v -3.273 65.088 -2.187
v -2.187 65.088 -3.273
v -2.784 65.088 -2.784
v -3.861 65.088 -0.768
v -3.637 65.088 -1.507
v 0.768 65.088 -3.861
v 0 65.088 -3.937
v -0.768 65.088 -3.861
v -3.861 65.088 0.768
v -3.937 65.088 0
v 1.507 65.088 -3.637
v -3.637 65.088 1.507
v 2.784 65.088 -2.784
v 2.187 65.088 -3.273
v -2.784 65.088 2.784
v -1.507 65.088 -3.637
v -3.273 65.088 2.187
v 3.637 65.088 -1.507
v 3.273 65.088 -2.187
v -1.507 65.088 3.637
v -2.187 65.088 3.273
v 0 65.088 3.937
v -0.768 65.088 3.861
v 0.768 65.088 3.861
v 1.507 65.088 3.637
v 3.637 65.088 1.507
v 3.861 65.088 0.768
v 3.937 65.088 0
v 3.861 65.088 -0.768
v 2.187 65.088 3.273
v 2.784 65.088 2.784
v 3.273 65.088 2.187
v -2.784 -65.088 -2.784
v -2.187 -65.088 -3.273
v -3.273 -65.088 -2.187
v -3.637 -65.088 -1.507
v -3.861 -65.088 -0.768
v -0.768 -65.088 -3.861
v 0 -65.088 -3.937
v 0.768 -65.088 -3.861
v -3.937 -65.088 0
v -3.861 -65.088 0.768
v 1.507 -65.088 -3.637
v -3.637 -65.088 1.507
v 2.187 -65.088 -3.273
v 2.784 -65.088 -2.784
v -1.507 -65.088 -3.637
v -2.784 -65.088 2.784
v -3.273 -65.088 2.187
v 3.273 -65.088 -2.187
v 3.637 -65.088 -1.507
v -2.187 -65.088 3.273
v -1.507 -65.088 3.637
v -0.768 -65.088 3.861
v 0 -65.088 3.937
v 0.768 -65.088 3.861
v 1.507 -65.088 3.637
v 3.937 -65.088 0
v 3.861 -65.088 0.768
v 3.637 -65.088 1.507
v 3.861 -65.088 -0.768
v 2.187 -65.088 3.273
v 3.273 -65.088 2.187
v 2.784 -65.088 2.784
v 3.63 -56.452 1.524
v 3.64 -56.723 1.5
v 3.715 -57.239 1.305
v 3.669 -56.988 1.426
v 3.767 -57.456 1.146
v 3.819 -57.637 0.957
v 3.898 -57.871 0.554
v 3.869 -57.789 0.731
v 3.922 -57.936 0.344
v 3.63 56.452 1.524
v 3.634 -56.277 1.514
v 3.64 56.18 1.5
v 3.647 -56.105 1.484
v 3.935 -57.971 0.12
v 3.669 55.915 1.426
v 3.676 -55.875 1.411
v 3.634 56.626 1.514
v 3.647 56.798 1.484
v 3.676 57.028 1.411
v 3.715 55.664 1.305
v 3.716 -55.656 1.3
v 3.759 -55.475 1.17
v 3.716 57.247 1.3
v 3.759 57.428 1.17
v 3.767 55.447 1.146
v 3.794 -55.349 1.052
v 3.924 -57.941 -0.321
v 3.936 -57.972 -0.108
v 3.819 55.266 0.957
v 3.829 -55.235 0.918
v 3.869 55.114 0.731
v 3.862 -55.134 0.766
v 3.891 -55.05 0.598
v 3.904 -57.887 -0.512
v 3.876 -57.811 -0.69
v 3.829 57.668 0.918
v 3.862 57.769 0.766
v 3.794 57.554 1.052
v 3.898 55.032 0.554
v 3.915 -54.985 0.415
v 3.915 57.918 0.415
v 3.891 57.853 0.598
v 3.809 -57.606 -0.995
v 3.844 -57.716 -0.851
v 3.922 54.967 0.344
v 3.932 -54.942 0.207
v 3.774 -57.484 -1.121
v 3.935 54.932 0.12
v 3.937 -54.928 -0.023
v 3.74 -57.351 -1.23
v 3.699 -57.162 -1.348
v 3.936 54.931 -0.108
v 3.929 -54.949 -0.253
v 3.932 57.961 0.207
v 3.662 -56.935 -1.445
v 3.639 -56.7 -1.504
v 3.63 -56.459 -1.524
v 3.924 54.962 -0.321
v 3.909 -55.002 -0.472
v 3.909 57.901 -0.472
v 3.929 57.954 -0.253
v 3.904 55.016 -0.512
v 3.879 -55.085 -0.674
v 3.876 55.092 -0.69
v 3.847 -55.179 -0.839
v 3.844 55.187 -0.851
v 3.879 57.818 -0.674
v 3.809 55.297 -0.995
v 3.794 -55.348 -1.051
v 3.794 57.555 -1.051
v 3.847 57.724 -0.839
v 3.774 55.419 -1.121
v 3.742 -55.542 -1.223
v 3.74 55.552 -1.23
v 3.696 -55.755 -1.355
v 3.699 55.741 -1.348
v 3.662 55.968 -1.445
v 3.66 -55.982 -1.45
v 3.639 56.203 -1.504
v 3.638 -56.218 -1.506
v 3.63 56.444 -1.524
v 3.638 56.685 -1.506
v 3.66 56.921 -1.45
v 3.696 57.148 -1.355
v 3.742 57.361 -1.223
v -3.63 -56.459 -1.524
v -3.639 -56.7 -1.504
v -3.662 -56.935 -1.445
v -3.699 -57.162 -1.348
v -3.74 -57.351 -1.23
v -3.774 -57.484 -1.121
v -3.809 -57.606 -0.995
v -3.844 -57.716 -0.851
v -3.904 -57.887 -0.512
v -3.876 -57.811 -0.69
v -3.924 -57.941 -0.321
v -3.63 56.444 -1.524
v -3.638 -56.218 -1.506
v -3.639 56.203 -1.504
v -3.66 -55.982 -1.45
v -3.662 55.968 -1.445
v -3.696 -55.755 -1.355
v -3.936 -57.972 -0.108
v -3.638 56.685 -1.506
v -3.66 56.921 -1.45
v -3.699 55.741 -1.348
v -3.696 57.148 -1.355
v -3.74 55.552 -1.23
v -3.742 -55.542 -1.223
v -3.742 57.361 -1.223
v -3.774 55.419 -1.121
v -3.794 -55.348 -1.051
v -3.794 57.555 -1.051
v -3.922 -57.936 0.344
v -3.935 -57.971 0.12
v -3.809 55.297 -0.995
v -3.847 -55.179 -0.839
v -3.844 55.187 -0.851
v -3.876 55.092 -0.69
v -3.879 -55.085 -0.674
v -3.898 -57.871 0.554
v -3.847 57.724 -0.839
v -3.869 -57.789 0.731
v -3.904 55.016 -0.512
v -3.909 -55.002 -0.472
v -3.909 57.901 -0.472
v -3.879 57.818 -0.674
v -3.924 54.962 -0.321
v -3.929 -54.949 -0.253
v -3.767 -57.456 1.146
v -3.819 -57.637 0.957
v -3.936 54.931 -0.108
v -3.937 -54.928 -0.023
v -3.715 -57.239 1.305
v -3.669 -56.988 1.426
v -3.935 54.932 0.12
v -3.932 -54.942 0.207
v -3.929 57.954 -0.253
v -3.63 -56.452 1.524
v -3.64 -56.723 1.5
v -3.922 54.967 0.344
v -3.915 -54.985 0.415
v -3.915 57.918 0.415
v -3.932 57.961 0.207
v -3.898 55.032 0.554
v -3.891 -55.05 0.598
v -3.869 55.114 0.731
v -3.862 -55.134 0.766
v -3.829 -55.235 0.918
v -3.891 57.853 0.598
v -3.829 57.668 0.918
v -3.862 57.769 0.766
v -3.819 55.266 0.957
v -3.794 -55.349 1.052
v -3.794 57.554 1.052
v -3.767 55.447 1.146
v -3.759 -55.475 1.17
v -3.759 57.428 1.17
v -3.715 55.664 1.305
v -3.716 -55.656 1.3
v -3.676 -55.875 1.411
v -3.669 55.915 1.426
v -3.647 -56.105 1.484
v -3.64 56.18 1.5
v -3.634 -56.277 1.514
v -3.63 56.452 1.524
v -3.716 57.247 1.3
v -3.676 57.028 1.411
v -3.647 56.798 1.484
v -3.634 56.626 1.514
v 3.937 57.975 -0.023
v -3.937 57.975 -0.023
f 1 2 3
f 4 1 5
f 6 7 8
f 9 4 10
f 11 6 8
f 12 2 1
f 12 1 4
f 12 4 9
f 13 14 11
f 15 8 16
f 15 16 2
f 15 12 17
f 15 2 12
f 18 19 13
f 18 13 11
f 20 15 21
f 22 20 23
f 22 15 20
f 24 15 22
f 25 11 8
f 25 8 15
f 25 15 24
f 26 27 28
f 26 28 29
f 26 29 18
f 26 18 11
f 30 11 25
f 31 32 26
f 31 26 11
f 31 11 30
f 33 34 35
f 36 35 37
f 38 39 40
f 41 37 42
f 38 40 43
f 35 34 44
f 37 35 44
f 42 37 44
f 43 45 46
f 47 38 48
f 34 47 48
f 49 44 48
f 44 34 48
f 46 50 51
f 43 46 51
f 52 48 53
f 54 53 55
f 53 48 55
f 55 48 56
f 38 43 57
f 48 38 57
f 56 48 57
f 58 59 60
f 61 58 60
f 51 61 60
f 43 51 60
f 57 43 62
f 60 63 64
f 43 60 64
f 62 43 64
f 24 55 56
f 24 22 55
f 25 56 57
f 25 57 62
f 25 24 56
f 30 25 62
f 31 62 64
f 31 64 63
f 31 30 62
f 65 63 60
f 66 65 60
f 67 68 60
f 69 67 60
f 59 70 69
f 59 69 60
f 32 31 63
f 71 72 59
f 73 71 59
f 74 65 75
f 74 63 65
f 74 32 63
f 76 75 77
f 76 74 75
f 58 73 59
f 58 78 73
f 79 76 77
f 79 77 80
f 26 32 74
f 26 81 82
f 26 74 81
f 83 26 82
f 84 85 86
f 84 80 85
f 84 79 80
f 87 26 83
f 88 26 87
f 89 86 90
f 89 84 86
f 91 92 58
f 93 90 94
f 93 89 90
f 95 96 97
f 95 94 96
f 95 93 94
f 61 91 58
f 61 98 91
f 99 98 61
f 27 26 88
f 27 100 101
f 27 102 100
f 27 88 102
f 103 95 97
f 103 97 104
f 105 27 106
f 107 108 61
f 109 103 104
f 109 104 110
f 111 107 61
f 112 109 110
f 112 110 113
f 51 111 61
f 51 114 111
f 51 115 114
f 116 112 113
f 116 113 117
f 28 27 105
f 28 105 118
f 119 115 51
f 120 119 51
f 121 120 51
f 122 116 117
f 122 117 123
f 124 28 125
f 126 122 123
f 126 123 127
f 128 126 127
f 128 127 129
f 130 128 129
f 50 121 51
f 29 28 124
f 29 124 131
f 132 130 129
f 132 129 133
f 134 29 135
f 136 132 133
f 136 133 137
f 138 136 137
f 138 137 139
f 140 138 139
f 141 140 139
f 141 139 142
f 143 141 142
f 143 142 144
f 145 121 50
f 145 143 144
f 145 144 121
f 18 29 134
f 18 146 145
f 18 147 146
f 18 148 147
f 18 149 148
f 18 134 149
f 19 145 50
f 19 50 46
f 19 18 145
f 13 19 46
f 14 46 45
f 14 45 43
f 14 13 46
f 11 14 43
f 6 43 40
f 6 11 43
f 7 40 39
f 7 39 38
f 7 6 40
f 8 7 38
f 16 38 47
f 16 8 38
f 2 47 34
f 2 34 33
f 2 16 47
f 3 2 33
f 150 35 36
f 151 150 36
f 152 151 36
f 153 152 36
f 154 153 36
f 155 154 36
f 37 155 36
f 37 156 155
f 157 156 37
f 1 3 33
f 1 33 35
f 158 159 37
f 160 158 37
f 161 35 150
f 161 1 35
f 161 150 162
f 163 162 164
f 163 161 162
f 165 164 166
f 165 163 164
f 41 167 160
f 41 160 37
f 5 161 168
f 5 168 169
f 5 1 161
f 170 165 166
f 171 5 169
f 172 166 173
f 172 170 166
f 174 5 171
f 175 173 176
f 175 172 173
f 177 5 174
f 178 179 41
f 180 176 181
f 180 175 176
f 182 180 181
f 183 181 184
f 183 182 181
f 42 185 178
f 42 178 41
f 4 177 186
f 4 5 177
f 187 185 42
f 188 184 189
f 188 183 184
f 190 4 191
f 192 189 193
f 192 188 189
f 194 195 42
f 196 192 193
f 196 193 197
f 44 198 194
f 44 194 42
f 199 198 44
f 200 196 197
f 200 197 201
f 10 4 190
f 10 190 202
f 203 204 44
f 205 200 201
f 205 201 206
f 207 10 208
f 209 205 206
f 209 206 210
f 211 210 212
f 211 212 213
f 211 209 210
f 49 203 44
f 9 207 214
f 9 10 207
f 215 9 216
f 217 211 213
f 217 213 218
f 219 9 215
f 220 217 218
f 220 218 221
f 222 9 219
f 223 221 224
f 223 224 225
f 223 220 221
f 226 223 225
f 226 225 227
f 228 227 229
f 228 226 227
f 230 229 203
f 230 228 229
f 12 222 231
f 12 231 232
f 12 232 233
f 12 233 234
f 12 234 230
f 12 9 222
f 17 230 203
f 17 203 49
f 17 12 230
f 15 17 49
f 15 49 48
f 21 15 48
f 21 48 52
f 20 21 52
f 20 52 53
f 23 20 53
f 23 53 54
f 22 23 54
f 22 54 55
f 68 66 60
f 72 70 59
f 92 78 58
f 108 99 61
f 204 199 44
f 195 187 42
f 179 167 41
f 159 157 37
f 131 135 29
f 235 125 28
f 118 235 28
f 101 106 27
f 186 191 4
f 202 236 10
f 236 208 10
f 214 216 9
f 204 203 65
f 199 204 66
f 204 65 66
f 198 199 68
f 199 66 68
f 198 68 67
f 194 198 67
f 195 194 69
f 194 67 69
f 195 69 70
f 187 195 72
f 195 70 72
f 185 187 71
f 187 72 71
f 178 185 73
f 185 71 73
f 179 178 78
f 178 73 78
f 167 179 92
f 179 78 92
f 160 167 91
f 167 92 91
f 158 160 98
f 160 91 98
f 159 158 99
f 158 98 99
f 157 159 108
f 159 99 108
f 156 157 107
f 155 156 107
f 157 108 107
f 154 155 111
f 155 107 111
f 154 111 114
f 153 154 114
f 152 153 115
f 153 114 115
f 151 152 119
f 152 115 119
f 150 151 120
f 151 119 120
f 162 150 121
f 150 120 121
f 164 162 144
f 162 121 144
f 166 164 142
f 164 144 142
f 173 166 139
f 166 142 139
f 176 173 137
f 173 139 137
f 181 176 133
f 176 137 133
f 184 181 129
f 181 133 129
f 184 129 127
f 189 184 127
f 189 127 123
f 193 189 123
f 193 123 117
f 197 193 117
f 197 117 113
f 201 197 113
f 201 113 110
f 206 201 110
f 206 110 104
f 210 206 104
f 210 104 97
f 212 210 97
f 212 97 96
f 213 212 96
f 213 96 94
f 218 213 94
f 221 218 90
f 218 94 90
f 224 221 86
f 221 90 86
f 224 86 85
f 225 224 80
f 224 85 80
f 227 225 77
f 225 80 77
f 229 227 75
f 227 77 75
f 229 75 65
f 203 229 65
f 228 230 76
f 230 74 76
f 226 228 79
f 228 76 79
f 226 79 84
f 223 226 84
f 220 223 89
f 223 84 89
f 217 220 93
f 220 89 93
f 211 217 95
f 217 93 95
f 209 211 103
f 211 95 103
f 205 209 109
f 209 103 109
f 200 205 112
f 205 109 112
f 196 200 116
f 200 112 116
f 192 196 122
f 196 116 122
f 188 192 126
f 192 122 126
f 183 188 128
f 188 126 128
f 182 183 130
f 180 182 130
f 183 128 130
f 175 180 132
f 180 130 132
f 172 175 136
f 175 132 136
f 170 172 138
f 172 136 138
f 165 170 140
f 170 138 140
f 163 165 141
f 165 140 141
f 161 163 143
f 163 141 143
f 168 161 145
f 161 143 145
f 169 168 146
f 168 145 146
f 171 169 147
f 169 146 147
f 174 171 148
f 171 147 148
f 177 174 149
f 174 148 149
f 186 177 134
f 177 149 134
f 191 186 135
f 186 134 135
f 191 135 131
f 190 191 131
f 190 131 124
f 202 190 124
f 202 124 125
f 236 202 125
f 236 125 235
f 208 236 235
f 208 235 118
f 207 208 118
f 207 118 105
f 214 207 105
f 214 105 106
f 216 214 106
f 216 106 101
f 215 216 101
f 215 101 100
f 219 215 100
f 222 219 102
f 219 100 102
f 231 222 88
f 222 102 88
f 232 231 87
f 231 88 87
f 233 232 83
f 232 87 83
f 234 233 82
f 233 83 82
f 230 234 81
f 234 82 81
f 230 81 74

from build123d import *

# Parameters (mm, degrees)
SKETCH1_R           = 3.937
BOSS_EXTRUDE1_DEPTH = 65.0875
SKETCH2_W           = 14.723977987
SKETCH2_H           = 1.524
SKETCH3_W           = 14.493300334
SKETCH3_H           = 1.524


with BuildPart() as part:
    # Sketch1 → Boss-Extrude1 (new, symmetric)
    with BuildSketch(Plane(origin=(0, 0, 0), x_dir=(1, 0, 0), z_dir=(0, 1, 0))):
        with Locations(Location((0, 0, 0), (0, 0, 270))):
            Circle(SKETCH1_R)
    extrude(amount=BOSS_EXTRUDE1_DEPTH, both=True)

    # Sketch2 → Cut-Revolve1 (revolve, cut)
    with BuildSketch(Plane.XY, mode=Mode.PRIVATE) as cut_revolve1_sk:
        with Locations((0.698328764, 57.2135)):
            Rectangle(SKETCH2_W, SKETCH2_H)
    revolve(cut_revolve1_sk.sketch.rotate(Axis((-6.663660229, 56.4515, 0), (1, 0, 0)), 90), axis=Axis((-6.663660229, 56.4515, 0), (1, 0, 0)), mode=Mode.SUBTRACT)

    # Sketch3 → Cut-Revolve2 (revolve, cut)
    with BuildSketch(Plane.XY, mode=Mode.PRIVATE) as cut_revolve2_sk:
        with Locations((0.075239778, -57.2135)):
            Rectangle(SKETCH3_W, SKETCH3_H)
    revolve(cut_revolve2_sk.sketch.rotate(Axis((-7.171410389, -56.4515, 0), (1, 0, 0)), 270), axis=Axis((-7.171410389, -56.4515, 0), (1, 0, 0)), mode=Mode.SUBTRACT)


solid = part.part
